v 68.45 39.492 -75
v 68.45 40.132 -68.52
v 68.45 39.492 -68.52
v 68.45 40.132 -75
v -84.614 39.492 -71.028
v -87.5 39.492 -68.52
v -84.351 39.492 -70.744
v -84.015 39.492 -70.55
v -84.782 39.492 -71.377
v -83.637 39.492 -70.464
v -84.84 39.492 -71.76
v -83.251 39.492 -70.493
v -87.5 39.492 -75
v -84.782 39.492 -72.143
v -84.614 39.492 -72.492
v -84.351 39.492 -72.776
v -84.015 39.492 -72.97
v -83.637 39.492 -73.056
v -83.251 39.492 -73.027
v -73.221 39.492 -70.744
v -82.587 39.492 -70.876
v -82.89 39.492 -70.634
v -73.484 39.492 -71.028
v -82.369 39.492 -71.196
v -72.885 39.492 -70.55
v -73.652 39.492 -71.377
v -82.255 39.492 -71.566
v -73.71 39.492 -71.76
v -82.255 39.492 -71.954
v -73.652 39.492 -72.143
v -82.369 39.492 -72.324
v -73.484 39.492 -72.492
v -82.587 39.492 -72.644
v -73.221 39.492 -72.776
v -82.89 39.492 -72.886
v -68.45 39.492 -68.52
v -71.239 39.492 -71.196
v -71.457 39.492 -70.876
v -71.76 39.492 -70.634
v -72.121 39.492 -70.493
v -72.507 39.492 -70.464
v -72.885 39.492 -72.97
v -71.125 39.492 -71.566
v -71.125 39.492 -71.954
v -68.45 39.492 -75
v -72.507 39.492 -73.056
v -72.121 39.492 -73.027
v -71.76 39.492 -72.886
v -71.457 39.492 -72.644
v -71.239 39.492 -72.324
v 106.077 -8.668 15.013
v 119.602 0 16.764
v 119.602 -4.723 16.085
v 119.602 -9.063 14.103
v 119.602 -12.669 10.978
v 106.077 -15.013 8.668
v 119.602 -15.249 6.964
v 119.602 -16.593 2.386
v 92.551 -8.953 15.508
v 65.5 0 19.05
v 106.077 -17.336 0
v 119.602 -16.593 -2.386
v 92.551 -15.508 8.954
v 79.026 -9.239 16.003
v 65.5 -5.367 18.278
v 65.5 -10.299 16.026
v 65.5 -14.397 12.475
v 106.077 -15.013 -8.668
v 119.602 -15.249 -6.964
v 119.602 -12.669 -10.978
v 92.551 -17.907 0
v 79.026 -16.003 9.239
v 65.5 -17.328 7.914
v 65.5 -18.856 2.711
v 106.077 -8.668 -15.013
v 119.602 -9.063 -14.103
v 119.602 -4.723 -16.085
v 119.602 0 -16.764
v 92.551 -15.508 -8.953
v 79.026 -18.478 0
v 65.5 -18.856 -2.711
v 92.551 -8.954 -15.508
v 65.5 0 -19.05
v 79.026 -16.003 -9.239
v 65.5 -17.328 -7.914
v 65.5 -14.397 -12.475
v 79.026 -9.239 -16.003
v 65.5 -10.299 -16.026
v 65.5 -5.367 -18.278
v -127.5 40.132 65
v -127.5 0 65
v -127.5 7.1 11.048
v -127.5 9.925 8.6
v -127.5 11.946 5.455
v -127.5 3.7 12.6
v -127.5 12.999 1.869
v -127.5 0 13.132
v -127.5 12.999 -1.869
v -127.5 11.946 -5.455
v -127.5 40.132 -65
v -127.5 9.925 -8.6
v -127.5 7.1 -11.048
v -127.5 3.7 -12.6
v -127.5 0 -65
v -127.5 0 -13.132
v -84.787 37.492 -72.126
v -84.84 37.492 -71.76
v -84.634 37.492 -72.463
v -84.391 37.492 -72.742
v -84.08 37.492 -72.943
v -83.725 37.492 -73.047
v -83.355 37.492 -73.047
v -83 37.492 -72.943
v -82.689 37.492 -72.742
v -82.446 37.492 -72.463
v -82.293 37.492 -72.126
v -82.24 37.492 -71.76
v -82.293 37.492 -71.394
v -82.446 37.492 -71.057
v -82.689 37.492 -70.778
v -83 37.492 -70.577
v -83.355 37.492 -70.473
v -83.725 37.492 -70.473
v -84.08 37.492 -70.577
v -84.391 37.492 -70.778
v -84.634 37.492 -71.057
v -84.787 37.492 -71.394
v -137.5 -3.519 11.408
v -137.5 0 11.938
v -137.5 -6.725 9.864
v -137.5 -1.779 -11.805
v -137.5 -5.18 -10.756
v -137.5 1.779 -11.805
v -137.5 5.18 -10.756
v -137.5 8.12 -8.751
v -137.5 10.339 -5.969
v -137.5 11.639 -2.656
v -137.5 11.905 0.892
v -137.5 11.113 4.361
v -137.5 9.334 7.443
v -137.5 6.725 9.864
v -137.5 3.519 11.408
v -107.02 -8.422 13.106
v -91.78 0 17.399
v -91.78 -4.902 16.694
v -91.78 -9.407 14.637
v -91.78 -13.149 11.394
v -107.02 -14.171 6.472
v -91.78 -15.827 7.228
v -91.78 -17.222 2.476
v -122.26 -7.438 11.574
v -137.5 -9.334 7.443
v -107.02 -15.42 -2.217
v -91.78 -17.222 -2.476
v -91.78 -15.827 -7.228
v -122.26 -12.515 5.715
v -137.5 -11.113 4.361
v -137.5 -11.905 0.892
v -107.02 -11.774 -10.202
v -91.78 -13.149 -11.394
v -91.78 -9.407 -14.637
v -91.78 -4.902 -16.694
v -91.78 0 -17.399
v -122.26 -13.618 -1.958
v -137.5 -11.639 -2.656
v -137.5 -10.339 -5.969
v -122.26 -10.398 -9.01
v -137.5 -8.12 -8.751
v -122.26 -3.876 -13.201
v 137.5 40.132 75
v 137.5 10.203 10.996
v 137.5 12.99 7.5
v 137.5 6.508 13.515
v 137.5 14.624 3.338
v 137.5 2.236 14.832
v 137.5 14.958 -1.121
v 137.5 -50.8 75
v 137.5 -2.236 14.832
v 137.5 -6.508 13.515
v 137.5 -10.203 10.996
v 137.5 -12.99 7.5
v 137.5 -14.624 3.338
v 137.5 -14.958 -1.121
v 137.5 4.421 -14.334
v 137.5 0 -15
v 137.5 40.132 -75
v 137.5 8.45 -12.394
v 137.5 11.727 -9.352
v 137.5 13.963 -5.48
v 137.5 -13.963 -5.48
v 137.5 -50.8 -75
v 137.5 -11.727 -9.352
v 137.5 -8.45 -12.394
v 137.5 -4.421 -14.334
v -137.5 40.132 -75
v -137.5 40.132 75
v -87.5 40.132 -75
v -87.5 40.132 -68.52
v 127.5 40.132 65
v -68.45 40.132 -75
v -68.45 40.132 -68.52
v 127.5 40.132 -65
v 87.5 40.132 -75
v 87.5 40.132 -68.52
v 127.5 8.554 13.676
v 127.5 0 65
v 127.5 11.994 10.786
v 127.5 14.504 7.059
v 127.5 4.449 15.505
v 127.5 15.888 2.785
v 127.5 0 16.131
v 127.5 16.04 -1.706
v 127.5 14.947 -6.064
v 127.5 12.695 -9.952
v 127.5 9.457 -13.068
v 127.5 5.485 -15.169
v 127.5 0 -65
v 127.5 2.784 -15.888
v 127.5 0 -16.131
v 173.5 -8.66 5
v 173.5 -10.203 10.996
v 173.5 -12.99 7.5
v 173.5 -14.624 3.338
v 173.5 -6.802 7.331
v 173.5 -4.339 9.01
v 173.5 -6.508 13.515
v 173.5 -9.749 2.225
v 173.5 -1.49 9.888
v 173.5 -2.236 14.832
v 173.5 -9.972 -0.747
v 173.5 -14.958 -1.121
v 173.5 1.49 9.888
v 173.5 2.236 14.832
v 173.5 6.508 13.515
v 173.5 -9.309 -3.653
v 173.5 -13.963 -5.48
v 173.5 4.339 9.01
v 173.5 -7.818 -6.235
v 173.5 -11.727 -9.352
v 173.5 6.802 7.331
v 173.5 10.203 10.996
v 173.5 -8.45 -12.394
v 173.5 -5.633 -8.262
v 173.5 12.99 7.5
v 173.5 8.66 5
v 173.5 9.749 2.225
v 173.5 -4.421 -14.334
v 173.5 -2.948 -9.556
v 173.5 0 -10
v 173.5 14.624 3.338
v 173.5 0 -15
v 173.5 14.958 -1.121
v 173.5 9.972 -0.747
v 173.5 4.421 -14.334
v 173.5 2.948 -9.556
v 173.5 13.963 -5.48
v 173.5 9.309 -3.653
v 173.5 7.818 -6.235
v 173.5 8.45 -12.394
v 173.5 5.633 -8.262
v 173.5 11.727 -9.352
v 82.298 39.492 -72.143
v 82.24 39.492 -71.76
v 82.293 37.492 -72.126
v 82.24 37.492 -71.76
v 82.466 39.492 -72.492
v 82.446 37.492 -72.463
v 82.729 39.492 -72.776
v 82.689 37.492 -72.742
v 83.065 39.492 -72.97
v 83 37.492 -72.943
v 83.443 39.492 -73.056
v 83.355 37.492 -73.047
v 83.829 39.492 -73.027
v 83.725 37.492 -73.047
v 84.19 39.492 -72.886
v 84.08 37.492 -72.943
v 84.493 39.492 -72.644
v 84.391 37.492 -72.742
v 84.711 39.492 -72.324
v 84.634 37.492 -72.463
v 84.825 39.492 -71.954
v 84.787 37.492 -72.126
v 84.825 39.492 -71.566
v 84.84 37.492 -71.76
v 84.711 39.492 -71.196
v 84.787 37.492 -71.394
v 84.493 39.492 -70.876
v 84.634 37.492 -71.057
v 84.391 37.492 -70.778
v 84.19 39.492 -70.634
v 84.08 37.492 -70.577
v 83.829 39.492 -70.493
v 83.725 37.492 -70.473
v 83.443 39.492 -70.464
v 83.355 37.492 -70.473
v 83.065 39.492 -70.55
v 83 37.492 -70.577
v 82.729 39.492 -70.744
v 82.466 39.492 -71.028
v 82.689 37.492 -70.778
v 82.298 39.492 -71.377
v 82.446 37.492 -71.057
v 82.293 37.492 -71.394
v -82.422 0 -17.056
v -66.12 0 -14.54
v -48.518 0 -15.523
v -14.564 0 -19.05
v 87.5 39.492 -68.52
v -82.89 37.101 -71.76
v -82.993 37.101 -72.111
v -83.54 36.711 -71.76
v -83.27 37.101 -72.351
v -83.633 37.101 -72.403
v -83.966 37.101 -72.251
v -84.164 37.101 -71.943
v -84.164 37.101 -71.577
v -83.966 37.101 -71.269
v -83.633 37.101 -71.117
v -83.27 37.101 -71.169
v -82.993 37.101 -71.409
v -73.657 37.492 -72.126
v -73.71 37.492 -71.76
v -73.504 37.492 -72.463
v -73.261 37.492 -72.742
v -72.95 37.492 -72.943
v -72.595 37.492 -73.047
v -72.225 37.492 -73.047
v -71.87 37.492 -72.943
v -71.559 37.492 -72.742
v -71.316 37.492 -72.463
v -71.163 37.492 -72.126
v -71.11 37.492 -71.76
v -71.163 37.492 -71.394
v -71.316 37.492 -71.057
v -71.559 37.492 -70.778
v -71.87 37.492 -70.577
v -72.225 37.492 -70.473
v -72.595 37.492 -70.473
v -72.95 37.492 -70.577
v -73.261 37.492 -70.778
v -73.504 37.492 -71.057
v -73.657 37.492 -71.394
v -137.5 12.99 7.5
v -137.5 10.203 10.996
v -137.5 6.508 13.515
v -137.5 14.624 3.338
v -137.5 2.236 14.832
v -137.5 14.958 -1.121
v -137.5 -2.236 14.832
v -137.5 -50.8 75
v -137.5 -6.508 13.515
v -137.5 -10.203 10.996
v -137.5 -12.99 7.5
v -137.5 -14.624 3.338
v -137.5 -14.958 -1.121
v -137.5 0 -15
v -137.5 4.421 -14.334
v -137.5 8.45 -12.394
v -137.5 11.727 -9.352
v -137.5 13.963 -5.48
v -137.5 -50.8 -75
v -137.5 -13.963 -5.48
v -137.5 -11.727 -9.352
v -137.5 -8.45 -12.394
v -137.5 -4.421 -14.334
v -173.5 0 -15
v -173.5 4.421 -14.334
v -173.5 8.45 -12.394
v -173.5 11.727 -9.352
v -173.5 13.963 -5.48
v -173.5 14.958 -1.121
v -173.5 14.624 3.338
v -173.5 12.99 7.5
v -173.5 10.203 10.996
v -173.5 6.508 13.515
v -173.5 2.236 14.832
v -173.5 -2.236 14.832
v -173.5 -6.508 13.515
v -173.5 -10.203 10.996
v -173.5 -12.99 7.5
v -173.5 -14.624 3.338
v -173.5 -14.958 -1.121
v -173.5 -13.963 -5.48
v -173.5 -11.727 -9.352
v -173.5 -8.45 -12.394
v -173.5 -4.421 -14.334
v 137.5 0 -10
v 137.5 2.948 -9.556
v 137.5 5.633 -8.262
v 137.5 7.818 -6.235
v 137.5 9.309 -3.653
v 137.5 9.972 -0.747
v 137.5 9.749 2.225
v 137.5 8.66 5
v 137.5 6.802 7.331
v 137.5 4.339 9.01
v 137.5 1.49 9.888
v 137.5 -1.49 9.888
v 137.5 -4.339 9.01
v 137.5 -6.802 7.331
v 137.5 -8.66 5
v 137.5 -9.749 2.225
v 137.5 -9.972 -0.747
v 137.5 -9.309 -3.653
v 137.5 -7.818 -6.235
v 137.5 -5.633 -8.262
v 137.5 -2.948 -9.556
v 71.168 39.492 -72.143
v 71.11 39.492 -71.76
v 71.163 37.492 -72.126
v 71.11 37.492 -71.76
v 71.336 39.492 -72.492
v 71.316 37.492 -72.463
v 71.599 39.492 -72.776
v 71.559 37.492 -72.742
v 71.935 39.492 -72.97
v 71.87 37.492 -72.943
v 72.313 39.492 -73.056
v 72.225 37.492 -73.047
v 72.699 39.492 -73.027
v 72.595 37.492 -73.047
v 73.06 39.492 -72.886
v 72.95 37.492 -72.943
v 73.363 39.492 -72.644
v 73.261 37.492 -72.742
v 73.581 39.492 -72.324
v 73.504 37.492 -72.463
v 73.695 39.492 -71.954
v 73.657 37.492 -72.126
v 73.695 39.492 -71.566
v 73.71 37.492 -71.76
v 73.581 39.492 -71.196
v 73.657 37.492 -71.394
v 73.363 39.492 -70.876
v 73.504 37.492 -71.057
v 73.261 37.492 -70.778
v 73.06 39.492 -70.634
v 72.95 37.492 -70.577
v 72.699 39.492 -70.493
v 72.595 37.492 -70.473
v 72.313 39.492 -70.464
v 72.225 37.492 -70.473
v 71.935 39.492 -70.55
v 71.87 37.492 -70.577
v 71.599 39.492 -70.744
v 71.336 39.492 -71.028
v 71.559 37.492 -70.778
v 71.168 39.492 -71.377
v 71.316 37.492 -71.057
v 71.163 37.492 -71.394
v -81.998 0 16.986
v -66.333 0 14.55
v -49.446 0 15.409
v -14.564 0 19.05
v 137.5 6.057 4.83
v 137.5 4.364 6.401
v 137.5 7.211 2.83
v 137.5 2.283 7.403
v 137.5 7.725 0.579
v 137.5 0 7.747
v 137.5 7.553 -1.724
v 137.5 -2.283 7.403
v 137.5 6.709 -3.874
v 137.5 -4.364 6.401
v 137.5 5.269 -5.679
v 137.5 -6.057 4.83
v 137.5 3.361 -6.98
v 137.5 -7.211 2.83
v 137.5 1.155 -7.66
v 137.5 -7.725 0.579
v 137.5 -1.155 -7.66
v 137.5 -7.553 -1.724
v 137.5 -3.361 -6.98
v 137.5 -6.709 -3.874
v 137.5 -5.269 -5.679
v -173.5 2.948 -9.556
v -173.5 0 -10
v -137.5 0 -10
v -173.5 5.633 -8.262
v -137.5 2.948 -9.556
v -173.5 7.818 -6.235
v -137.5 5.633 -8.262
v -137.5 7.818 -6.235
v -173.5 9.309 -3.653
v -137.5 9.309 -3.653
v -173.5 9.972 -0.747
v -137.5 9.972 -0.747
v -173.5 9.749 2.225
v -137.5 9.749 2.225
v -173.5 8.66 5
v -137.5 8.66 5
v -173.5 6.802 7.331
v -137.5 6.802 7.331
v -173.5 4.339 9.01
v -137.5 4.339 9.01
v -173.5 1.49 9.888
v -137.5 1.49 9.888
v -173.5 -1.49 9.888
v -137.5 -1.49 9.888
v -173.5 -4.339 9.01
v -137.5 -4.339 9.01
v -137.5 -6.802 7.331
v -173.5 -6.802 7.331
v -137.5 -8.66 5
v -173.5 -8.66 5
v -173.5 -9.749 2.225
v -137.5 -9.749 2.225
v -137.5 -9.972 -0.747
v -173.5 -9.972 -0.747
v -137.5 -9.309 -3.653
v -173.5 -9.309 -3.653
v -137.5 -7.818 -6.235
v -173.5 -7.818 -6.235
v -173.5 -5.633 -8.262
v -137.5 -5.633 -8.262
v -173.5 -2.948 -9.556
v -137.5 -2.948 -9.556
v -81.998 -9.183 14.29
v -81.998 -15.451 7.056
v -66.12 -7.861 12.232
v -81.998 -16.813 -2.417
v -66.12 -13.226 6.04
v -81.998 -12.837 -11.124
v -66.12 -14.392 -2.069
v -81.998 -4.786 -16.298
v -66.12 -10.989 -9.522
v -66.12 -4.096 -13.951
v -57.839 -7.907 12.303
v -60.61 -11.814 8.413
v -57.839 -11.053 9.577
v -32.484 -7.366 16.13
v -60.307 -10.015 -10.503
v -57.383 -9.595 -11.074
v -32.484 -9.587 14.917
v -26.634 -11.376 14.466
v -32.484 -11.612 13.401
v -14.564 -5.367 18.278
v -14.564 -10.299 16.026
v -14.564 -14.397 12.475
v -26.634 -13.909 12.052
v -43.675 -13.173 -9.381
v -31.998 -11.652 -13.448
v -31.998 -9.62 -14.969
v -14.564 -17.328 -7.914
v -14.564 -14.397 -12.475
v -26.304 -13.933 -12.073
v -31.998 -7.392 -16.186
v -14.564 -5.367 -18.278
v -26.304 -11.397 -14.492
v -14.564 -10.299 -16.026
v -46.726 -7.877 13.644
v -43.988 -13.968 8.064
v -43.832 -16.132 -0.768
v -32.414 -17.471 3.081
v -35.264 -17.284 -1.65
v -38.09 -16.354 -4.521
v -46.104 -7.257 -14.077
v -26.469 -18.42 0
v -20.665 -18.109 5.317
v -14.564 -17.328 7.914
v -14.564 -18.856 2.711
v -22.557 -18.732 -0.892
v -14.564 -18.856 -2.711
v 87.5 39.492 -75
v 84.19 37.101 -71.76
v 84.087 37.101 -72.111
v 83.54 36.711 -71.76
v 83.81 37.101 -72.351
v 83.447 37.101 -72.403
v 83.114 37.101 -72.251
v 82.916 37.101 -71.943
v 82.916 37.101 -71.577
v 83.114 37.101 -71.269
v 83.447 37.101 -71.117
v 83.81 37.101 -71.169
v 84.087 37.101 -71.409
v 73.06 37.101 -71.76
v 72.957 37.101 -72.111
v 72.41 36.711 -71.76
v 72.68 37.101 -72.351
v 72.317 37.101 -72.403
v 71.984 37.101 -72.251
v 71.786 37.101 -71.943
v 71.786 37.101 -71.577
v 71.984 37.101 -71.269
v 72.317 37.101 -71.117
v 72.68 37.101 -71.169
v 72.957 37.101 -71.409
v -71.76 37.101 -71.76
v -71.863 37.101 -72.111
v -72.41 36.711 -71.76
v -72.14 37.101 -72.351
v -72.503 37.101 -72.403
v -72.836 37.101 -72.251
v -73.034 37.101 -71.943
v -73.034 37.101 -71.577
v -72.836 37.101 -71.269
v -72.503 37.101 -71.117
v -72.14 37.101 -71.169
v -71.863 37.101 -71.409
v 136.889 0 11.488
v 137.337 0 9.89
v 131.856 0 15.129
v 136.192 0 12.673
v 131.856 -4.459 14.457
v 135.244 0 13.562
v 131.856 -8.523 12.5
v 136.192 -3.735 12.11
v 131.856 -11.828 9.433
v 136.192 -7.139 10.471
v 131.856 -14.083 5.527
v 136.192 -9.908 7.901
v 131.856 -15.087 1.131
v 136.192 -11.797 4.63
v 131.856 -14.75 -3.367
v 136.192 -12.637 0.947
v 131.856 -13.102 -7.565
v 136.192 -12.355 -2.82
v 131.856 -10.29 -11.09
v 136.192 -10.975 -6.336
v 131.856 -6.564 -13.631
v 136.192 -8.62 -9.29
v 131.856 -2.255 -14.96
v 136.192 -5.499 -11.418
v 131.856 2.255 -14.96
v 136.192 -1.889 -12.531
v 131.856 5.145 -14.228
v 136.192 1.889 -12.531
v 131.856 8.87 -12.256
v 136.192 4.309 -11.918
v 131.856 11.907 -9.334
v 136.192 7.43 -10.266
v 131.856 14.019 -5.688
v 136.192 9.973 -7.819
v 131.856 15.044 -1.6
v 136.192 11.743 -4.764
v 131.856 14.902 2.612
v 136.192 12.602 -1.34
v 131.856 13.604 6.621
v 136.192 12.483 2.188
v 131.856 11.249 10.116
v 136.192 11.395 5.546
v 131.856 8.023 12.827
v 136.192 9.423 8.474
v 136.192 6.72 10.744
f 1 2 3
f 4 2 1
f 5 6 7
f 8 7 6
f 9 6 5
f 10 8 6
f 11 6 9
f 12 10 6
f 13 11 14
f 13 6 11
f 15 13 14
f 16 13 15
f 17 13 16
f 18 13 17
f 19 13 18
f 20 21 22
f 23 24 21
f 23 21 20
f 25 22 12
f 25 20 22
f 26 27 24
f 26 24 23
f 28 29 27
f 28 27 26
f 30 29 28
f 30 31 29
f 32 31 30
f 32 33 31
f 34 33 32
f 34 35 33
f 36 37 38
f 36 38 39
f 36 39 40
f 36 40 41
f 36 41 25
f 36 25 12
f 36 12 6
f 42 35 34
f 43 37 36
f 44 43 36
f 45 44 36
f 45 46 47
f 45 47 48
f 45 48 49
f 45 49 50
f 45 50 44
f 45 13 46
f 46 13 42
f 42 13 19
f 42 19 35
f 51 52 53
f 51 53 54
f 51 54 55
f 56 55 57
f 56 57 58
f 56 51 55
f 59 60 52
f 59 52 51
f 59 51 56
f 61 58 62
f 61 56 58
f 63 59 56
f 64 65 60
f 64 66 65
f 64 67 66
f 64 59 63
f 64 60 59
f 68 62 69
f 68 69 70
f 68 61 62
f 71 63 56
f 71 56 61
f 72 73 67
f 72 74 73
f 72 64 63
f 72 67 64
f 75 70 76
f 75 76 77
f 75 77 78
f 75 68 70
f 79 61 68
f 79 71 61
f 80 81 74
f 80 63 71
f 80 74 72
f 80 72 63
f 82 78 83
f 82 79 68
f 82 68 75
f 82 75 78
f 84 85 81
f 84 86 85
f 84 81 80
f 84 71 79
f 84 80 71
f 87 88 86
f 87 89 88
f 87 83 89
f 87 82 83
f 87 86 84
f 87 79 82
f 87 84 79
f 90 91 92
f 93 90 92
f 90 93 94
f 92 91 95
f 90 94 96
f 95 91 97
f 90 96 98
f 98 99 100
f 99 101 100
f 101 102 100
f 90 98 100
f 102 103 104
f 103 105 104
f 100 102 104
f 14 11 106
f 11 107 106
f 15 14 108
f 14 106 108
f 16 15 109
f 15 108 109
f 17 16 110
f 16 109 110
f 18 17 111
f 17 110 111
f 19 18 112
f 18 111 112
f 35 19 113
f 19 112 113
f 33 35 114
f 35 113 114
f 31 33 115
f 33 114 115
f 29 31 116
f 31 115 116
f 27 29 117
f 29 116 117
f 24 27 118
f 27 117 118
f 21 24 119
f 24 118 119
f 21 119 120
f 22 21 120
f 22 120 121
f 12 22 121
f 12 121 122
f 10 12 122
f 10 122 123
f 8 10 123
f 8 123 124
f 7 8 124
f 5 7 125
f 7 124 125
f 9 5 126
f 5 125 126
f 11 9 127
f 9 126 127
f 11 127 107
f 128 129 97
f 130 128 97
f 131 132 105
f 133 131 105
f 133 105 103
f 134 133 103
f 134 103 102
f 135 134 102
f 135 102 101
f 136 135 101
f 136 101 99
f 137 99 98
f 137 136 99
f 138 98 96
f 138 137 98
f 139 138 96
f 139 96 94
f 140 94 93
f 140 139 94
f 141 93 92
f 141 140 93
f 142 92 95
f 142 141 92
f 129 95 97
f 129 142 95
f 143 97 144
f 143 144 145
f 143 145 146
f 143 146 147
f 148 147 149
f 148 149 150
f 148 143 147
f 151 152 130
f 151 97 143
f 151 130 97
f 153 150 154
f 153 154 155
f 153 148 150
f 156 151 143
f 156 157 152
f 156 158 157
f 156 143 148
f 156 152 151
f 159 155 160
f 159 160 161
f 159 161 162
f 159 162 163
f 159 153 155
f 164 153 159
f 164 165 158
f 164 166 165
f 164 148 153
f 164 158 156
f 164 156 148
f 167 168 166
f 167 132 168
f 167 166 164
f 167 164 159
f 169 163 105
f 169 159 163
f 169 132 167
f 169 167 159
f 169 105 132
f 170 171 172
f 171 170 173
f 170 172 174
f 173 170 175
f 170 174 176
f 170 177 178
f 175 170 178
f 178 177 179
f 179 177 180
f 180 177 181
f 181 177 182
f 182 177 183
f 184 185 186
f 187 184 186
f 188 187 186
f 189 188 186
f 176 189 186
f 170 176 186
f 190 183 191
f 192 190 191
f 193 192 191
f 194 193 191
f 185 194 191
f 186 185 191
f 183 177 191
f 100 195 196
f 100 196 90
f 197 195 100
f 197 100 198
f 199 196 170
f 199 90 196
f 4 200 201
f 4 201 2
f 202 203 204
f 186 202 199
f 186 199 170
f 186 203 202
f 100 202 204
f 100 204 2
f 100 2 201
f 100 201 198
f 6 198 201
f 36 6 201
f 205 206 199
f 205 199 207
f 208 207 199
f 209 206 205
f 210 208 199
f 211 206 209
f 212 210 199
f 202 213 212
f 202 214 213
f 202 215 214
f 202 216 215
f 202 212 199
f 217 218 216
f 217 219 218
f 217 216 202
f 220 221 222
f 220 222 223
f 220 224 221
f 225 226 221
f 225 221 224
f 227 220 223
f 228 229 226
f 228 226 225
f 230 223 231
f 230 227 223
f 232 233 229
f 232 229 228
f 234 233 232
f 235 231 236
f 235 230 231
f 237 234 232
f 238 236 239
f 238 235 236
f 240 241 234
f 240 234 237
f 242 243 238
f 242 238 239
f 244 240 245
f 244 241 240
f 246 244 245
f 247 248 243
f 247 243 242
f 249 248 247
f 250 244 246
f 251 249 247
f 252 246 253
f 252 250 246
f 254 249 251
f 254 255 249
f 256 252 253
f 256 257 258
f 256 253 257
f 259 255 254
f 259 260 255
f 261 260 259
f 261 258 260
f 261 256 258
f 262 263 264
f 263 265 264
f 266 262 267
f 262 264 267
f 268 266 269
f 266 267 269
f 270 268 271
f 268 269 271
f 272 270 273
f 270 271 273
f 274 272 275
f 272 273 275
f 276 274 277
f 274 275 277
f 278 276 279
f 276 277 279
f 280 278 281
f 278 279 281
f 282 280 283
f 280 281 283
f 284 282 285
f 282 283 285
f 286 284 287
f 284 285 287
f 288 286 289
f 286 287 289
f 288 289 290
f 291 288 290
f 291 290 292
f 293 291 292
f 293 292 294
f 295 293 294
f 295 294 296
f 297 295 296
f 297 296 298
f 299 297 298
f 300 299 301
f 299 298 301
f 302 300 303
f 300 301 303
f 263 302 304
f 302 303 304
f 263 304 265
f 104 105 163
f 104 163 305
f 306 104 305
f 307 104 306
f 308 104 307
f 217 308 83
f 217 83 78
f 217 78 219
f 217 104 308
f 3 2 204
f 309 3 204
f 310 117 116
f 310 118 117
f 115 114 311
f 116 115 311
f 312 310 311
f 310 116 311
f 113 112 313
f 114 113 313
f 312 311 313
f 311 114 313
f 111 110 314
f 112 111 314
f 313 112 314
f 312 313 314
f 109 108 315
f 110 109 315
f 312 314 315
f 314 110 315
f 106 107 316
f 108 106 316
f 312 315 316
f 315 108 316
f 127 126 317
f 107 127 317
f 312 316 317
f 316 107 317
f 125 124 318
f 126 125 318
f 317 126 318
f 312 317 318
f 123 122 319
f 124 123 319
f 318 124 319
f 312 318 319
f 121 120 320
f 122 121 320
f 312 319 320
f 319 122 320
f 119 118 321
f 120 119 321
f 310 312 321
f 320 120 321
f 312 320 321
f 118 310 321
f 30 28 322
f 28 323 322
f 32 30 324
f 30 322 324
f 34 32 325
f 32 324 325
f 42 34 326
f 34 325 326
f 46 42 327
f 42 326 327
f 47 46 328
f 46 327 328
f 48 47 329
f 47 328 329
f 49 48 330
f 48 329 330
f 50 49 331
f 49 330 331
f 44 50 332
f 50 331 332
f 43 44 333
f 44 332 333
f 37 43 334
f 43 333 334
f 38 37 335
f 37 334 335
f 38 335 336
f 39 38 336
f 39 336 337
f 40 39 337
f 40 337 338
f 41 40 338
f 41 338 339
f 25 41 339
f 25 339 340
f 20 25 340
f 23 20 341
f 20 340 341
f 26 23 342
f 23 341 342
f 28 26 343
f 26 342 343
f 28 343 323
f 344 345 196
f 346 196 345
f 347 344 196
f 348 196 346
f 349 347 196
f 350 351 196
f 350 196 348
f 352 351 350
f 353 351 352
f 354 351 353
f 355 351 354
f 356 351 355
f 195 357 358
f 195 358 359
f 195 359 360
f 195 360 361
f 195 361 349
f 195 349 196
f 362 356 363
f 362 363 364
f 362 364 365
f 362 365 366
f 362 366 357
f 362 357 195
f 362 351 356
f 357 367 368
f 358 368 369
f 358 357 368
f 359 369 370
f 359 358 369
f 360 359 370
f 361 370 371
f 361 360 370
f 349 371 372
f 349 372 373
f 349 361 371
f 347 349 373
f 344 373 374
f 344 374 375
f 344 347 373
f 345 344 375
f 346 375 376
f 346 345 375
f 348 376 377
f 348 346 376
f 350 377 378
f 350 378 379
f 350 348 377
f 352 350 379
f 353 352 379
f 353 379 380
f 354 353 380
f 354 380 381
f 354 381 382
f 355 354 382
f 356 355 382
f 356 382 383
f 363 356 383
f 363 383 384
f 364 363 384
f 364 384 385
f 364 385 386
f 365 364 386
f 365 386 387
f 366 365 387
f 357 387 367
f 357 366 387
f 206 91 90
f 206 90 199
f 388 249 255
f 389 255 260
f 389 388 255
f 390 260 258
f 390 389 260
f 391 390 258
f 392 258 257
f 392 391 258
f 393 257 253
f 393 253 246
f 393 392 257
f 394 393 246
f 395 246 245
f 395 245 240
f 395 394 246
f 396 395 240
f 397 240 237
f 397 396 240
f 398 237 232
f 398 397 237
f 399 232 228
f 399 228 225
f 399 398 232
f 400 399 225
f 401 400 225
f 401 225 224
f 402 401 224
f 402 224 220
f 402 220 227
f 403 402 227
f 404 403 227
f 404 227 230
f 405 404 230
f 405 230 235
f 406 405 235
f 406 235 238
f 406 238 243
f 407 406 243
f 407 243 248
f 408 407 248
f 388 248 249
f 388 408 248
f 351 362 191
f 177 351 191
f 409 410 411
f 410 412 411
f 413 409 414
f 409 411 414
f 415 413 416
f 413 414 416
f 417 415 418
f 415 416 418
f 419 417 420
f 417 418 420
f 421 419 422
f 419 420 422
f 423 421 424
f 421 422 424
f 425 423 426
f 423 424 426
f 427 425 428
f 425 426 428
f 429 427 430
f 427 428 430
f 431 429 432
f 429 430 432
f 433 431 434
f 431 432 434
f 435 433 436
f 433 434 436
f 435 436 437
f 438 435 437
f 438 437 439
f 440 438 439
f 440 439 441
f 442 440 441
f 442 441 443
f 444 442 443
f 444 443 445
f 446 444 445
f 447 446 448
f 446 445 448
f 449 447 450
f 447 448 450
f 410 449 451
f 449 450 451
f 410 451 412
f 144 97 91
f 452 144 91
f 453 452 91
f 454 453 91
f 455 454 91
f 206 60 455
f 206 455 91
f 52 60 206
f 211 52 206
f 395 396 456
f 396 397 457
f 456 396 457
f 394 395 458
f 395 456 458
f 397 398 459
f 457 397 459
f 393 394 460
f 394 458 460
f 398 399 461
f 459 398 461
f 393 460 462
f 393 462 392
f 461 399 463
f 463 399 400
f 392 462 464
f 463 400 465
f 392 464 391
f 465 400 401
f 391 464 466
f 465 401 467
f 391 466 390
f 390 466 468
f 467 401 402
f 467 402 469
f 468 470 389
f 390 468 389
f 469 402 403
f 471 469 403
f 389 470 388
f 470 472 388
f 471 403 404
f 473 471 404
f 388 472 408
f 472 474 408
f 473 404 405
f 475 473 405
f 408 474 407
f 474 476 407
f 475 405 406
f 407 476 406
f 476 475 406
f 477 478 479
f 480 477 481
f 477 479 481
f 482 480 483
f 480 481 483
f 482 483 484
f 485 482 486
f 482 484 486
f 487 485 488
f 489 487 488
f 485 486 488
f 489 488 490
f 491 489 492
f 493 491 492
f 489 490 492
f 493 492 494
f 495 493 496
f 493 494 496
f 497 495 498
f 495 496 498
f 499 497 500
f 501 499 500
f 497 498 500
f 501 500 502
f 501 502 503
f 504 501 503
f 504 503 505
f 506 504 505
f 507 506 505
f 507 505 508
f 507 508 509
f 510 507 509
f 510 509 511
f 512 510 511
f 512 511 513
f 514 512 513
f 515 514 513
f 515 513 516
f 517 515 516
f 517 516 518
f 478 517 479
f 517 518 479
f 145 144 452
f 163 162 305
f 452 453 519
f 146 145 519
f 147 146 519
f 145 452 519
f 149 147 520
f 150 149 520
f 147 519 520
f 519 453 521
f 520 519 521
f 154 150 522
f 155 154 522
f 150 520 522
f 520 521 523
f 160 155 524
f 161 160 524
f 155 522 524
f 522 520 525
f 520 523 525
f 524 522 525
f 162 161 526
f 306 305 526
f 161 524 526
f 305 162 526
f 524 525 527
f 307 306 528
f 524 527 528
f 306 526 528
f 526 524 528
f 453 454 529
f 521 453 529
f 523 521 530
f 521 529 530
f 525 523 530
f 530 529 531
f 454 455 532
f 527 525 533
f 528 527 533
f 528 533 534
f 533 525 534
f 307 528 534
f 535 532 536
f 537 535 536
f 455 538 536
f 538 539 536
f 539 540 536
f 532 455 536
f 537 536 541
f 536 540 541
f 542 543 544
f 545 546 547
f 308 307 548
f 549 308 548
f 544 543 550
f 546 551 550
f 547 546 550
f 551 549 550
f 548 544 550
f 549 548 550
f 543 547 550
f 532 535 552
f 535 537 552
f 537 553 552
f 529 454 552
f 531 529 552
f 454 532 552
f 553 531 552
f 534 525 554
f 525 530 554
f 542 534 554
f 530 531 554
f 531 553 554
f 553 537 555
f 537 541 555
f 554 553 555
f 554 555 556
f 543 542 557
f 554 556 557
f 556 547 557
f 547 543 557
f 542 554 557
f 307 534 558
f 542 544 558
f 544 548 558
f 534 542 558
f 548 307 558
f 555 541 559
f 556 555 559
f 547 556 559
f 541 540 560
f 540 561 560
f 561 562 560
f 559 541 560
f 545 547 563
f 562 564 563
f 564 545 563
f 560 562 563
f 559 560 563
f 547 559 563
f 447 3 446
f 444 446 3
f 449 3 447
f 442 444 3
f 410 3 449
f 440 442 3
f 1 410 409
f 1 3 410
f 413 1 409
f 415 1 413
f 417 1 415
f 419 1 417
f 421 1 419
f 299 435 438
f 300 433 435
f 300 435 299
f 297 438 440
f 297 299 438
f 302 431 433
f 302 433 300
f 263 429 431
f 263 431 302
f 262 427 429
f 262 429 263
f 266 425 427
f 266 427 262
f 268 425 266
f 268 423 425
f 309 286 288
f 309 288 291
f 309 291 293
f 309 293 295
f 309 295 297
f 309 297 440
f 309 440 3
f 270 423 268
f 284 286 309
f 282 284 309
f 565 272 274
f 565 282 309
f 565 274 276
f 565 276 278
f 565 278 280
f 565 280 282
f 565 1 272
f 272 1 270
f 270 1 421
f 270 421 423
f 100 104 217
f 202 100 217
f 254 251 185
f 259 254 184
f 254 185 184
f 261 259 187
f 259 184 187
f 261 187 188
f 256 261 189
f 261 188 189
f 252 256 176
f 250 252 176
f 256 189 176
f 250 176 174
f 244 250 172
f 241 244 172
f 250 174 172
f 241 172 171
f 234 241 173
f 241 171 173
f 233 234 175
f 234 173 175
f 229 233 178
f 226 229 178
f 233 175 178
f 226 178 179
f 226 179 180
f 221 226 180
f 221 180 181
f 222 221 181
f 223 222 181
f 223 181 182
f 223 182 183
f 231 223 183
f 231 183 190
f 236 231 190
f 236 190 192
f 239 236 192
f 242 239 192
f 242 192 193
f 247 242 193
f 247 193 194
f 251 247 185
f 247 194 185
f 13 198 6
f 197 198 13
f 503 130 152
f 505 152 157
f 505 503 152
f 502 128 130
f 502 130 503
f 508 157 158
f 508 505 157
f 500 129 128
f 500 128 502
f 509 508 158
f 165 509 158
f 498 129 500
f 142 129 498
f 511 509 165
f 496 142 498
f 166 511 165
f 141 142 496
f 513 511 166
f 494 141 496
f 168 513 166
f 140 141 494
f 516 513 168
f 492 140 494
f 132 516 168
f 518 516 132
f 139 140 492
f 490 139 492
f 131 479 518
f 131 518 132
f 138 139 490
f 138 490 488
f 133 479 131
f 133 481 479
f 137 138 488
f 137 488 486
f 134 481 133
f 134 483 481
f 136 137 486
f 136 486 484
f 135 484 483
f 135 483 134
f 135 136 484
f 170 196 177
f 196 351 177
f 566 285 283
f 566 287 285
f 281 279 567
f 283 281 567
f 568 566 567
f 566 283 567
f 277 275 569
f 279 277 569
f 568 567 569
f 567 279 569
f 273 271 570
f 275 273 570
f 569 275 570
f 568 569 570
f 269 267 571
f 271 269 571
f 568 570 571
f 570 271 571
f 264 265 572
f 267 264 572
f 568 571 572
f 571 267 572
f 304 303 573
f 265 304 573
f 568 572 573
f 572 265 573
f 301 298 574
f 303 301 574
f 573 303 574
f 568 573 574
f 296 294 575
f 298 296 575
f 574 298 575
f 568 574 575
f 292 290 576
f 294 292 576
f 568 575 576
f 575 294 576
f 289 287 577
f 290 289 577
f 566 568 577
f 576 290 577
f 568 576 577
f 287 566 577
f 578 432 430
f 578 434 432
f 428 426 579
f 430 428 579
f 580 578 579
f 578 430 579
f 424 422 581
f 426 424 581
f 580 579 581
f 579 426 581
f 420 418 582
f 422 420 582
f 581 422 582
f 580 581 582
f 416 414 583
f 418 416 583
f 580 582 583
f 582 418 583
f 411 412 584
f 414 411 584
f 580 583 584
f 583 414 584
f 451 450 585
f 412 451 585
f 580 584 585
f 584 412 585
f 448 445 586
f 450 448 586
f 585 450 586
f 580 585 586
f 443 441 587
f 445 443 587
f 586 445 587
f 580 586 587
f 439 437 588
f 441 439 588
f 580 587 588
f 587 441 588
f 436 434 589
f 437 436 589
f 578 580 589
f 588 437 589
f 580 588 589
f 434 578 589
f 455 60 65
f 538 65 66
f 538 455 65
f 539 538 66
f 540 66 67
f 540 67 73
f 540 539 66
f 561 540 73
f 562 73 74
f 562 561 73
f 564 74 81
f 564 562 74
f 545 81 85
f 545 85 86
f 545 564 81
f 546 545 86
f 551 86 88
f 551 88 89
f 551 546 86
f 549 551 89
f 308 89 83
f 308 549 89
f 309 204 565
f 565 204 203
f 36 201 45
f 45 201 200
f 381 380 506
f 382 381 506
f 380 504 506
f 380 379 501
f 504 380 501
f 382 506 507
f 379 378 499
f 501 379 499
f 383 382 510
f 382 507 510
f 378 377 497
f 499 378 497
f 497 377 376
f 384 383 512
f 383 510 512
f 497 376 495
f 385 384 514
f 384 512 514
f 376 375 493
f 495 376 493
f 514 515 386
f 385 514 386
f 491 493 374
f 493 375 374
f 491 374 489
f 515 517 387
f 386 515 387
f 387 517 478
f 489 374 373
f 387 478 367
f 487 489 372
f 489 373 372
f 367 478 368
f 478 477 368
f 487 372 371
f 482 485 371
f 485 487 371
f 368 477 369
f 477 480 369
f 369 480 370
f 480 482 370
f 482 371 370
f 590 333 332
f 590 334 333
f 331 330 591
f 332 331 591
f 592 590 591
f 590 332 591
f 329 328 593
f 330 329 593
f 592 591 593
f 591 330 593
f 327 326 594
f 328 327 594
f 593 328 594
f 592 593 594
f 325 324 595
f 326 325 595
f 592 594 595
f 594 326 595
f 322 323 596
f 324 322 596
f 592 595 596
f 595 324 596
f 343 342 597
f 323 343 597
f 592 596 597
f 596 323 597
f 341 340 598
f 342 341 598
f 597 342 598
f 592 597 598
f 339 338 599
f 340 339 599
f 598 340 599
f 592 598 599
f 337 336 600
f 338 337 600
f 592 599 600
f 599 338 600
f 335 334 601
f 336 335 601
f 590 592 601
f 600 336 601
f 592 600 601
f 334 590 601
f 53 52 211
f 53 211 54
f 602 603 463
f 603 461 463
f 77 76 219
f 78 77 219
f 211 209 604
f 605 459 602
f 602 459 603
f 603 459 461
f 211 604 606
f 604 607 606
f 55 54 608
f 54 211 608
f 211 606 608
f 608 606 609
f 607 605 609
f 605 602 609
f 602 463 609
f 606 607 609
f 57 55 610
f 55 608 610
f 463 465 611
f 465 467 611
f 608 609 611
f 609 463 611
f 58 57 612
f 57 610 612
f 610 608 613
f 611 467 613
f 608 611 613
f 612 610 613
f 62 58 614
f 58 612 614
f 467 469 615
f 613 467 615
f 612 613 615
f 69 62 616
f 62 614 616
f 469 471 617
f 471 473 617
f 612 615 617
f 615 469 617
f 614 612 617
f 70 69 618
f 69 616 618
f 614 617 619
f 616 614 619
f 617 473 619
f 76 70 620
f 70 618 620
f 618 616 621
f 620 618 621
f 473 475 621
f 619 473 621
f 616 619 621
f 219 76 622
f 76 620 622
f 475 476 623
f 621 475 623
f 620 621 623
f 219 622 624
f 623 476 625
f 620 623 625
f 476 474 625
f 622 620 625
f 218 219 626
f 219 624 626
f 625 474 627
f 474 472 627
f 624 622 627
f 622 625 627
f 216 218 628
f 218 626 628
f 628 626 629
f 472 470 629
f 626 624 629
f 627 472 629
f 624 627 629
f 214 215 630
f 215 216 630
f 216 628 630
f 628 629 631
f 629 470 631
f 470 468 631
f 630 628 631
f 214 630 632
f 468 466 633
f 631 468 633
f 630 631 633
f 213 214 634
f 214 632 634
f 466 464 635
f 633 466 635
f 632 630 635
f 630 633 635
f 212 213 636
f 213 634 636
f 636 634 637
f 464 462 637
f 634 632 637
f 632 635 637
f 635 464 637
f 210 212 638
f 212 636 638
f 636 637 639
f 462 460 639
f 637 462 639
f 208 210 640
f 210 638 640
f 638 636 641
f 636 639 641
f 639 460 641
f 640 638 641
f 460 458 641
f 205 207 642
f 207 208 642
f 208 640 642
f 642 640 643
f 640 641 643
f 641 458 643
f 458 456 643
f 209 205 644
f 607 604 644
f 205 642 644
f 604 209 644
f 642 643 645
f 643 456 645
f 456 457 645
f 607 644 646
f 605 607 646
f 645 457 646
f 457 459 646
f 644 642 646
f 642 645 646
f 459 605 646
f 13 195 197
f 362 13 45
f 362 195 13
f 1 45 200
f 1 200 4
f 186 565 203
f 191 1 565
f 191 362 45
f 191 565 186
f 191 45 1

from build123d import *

# Parameters (mm, degrees)
BOSS_EXTRUDE1_DEPTH      = 75
BOSS_EXTRUDE1_DEPTH_BACK = 75
SKETCH2_W                = 275
SKETCH2_H                = 50.8
SKETCH4_W                = 275
SKETCH4_H                = 150
SKETCH4_W_2              = 255
SKETCH4_H_2              = 130
BOSS_EXTRUDE4_DEPTH      = 40.132
SKETCH3_R                = 15
SKETCH3_R_2              = 10
BOSS_EXTRUDE2_DEPTH      = 36
SKETCH5_W                = 19.05
SKETCH5_H                = 6.48
CUT_EXTRUDE1_DEPTH       = 0.64
M2_CLEARANCE_HOLE1_D     = 2.6
M2_CLEARANCE_HOLE1_DEPTH = 2
M2_CLEARANCE_HOLE1_TIP   = 0.781118805


with BuildPart() as part:
    # Sketch2 → Boss-Extrude1 (new, two sides: drawn at the far end of the back side and taken through both)
    with BuildSketch(Plane.XY.offset(-BOSS_EXTRUDE1_DEPTH_BACK)):
        with Locations((0, -25.4)):
            Rectangle(SKETCH2_W, SKETCH2_H)
    extrude(amount=BOSS_EXTRUDE1_DEPTH + BOSS_EXTRUDE1_DEPTH_BACK)

    # Sketch4 → Boss-Extrude4 (add)
    with BuildSketch(Plane(origin=(0, 0, 0), x_dir=(1, 0, 0), z_dir=(0, 1, 0))):
        Rectangle(SKETCH4_W, SKETCH4_H)
        Rectangle(SKETCH4_W_2, SKETCH4_H_2, mode=Mode.SUBTRACT)
    extrude(amount=BOSS_EXTRUDE4_DEPTH)

    # Sketch1 → Cut-Revolve1 (revolve, cut)
    with BuildSketch(Plane.XY):
        with BuildLine():
            Line((-137.5, 0), (137.5, 0))
            Line((137.5, 0), (137.5, 7.747))
            add(Edge.make_bspline(
                [(119.602, 16.764), (126.446685513, 16.474787936), (132.251729161, 15.730759902), (137.5, 12.322795174), (137.5, 7.747)],
                knots=[0, 0, 0, 0, 0.656247862, 1, 1, 1, 1], degree=3))
            Line((119.602, 16.764), (65.5, 19.05))
            Line((65.5, 19.05), (-14.564, 19.05))
            add(Edge.make_bspline(
                [(-91.78, 17.399), (-84.901336541, 18.220618135), (-60.549292723, 10.012805319), (-35.82944709, 19.05), (-14.564, 19.05)],
                knots=[0, 0, 0, 0, 0.244238151, 1, 1, 1, 1], degree=3))
            Line((-91.78, 17.399), (-137.5, 11.938))
            Line((-137.5, 11.938), (-137.5, 0))
        make_face()
    revolve(axis=Axis((-137.5, 0, 0), (1, 0, 0)), mode=Mode.SUBTRACT)

    # Sketch3 → Boss-Extrude2 (add)
    with BuildSketch(Plane(origin=(137.5, 0, 0), x_dir=(0, 0, -1), z_dir=(1, 0, 0))):
        Circle(SKETCH3_R)
        Circle(SKETCH3_R_2, mode=Mode.SUBTRACT)
    boss_extrude2 = extrude(amount=BOSS_EXTRUDE2_DEPTH)

    # Mirror1: Boss-Extrude2 across plane
    add(boss_extrude2.mirror(Plane(origin=(0, 0, 0), x_dir=(0, 0, 1), z_dir=(1, 0, 0))))

    # Sketch5 → Cut-Extrude1 (cut)
    with BuildSketch(Plane(origin=(0, 40.132, 0), x_dir=(1, 0, 0), z_dir=(0, 1, 0))):
        with Locations((-77.975, 71.76)):
            Rectangle(SKETCH5_W, SKETCH5_H)
        with Locations((77.975, 71.76)):
            Rectangle(SKETCH5_W, SKETCH5_H)
    extrude(amount=-CUT_EXTRUDE1_DEPTH, mode=Mode.SUBTRACT)

    # M2 Clearance Hole1
    with Locations(Plane(origin=(0, 39.492, 0), x_dir=(1, 0, 0), z_dir=(0, 1, 0))):
        with Locations((-83.54, 71.76), (-72.41, 71.76), (72.41, 71.76), (83.54, 71.76)):
            Hole(M2_CLEARANCE_HOLE1_D / 2, depth=M2_CLEARANCE_HOLE1_DEPTH)
            with Locations((0, 0, -(M2_CLEARANCE_HOLE1_DEPTH + M2_CLEARANCE_HOLE1_TIP / 2))):  # 118° drill point
                Cone(0, M2_CLEARANCE_HOLE1_D / 2, M2_CLEARANCE_HOLE1_TIP, mode=Mode.SUBTRACT)


solid = part.part
